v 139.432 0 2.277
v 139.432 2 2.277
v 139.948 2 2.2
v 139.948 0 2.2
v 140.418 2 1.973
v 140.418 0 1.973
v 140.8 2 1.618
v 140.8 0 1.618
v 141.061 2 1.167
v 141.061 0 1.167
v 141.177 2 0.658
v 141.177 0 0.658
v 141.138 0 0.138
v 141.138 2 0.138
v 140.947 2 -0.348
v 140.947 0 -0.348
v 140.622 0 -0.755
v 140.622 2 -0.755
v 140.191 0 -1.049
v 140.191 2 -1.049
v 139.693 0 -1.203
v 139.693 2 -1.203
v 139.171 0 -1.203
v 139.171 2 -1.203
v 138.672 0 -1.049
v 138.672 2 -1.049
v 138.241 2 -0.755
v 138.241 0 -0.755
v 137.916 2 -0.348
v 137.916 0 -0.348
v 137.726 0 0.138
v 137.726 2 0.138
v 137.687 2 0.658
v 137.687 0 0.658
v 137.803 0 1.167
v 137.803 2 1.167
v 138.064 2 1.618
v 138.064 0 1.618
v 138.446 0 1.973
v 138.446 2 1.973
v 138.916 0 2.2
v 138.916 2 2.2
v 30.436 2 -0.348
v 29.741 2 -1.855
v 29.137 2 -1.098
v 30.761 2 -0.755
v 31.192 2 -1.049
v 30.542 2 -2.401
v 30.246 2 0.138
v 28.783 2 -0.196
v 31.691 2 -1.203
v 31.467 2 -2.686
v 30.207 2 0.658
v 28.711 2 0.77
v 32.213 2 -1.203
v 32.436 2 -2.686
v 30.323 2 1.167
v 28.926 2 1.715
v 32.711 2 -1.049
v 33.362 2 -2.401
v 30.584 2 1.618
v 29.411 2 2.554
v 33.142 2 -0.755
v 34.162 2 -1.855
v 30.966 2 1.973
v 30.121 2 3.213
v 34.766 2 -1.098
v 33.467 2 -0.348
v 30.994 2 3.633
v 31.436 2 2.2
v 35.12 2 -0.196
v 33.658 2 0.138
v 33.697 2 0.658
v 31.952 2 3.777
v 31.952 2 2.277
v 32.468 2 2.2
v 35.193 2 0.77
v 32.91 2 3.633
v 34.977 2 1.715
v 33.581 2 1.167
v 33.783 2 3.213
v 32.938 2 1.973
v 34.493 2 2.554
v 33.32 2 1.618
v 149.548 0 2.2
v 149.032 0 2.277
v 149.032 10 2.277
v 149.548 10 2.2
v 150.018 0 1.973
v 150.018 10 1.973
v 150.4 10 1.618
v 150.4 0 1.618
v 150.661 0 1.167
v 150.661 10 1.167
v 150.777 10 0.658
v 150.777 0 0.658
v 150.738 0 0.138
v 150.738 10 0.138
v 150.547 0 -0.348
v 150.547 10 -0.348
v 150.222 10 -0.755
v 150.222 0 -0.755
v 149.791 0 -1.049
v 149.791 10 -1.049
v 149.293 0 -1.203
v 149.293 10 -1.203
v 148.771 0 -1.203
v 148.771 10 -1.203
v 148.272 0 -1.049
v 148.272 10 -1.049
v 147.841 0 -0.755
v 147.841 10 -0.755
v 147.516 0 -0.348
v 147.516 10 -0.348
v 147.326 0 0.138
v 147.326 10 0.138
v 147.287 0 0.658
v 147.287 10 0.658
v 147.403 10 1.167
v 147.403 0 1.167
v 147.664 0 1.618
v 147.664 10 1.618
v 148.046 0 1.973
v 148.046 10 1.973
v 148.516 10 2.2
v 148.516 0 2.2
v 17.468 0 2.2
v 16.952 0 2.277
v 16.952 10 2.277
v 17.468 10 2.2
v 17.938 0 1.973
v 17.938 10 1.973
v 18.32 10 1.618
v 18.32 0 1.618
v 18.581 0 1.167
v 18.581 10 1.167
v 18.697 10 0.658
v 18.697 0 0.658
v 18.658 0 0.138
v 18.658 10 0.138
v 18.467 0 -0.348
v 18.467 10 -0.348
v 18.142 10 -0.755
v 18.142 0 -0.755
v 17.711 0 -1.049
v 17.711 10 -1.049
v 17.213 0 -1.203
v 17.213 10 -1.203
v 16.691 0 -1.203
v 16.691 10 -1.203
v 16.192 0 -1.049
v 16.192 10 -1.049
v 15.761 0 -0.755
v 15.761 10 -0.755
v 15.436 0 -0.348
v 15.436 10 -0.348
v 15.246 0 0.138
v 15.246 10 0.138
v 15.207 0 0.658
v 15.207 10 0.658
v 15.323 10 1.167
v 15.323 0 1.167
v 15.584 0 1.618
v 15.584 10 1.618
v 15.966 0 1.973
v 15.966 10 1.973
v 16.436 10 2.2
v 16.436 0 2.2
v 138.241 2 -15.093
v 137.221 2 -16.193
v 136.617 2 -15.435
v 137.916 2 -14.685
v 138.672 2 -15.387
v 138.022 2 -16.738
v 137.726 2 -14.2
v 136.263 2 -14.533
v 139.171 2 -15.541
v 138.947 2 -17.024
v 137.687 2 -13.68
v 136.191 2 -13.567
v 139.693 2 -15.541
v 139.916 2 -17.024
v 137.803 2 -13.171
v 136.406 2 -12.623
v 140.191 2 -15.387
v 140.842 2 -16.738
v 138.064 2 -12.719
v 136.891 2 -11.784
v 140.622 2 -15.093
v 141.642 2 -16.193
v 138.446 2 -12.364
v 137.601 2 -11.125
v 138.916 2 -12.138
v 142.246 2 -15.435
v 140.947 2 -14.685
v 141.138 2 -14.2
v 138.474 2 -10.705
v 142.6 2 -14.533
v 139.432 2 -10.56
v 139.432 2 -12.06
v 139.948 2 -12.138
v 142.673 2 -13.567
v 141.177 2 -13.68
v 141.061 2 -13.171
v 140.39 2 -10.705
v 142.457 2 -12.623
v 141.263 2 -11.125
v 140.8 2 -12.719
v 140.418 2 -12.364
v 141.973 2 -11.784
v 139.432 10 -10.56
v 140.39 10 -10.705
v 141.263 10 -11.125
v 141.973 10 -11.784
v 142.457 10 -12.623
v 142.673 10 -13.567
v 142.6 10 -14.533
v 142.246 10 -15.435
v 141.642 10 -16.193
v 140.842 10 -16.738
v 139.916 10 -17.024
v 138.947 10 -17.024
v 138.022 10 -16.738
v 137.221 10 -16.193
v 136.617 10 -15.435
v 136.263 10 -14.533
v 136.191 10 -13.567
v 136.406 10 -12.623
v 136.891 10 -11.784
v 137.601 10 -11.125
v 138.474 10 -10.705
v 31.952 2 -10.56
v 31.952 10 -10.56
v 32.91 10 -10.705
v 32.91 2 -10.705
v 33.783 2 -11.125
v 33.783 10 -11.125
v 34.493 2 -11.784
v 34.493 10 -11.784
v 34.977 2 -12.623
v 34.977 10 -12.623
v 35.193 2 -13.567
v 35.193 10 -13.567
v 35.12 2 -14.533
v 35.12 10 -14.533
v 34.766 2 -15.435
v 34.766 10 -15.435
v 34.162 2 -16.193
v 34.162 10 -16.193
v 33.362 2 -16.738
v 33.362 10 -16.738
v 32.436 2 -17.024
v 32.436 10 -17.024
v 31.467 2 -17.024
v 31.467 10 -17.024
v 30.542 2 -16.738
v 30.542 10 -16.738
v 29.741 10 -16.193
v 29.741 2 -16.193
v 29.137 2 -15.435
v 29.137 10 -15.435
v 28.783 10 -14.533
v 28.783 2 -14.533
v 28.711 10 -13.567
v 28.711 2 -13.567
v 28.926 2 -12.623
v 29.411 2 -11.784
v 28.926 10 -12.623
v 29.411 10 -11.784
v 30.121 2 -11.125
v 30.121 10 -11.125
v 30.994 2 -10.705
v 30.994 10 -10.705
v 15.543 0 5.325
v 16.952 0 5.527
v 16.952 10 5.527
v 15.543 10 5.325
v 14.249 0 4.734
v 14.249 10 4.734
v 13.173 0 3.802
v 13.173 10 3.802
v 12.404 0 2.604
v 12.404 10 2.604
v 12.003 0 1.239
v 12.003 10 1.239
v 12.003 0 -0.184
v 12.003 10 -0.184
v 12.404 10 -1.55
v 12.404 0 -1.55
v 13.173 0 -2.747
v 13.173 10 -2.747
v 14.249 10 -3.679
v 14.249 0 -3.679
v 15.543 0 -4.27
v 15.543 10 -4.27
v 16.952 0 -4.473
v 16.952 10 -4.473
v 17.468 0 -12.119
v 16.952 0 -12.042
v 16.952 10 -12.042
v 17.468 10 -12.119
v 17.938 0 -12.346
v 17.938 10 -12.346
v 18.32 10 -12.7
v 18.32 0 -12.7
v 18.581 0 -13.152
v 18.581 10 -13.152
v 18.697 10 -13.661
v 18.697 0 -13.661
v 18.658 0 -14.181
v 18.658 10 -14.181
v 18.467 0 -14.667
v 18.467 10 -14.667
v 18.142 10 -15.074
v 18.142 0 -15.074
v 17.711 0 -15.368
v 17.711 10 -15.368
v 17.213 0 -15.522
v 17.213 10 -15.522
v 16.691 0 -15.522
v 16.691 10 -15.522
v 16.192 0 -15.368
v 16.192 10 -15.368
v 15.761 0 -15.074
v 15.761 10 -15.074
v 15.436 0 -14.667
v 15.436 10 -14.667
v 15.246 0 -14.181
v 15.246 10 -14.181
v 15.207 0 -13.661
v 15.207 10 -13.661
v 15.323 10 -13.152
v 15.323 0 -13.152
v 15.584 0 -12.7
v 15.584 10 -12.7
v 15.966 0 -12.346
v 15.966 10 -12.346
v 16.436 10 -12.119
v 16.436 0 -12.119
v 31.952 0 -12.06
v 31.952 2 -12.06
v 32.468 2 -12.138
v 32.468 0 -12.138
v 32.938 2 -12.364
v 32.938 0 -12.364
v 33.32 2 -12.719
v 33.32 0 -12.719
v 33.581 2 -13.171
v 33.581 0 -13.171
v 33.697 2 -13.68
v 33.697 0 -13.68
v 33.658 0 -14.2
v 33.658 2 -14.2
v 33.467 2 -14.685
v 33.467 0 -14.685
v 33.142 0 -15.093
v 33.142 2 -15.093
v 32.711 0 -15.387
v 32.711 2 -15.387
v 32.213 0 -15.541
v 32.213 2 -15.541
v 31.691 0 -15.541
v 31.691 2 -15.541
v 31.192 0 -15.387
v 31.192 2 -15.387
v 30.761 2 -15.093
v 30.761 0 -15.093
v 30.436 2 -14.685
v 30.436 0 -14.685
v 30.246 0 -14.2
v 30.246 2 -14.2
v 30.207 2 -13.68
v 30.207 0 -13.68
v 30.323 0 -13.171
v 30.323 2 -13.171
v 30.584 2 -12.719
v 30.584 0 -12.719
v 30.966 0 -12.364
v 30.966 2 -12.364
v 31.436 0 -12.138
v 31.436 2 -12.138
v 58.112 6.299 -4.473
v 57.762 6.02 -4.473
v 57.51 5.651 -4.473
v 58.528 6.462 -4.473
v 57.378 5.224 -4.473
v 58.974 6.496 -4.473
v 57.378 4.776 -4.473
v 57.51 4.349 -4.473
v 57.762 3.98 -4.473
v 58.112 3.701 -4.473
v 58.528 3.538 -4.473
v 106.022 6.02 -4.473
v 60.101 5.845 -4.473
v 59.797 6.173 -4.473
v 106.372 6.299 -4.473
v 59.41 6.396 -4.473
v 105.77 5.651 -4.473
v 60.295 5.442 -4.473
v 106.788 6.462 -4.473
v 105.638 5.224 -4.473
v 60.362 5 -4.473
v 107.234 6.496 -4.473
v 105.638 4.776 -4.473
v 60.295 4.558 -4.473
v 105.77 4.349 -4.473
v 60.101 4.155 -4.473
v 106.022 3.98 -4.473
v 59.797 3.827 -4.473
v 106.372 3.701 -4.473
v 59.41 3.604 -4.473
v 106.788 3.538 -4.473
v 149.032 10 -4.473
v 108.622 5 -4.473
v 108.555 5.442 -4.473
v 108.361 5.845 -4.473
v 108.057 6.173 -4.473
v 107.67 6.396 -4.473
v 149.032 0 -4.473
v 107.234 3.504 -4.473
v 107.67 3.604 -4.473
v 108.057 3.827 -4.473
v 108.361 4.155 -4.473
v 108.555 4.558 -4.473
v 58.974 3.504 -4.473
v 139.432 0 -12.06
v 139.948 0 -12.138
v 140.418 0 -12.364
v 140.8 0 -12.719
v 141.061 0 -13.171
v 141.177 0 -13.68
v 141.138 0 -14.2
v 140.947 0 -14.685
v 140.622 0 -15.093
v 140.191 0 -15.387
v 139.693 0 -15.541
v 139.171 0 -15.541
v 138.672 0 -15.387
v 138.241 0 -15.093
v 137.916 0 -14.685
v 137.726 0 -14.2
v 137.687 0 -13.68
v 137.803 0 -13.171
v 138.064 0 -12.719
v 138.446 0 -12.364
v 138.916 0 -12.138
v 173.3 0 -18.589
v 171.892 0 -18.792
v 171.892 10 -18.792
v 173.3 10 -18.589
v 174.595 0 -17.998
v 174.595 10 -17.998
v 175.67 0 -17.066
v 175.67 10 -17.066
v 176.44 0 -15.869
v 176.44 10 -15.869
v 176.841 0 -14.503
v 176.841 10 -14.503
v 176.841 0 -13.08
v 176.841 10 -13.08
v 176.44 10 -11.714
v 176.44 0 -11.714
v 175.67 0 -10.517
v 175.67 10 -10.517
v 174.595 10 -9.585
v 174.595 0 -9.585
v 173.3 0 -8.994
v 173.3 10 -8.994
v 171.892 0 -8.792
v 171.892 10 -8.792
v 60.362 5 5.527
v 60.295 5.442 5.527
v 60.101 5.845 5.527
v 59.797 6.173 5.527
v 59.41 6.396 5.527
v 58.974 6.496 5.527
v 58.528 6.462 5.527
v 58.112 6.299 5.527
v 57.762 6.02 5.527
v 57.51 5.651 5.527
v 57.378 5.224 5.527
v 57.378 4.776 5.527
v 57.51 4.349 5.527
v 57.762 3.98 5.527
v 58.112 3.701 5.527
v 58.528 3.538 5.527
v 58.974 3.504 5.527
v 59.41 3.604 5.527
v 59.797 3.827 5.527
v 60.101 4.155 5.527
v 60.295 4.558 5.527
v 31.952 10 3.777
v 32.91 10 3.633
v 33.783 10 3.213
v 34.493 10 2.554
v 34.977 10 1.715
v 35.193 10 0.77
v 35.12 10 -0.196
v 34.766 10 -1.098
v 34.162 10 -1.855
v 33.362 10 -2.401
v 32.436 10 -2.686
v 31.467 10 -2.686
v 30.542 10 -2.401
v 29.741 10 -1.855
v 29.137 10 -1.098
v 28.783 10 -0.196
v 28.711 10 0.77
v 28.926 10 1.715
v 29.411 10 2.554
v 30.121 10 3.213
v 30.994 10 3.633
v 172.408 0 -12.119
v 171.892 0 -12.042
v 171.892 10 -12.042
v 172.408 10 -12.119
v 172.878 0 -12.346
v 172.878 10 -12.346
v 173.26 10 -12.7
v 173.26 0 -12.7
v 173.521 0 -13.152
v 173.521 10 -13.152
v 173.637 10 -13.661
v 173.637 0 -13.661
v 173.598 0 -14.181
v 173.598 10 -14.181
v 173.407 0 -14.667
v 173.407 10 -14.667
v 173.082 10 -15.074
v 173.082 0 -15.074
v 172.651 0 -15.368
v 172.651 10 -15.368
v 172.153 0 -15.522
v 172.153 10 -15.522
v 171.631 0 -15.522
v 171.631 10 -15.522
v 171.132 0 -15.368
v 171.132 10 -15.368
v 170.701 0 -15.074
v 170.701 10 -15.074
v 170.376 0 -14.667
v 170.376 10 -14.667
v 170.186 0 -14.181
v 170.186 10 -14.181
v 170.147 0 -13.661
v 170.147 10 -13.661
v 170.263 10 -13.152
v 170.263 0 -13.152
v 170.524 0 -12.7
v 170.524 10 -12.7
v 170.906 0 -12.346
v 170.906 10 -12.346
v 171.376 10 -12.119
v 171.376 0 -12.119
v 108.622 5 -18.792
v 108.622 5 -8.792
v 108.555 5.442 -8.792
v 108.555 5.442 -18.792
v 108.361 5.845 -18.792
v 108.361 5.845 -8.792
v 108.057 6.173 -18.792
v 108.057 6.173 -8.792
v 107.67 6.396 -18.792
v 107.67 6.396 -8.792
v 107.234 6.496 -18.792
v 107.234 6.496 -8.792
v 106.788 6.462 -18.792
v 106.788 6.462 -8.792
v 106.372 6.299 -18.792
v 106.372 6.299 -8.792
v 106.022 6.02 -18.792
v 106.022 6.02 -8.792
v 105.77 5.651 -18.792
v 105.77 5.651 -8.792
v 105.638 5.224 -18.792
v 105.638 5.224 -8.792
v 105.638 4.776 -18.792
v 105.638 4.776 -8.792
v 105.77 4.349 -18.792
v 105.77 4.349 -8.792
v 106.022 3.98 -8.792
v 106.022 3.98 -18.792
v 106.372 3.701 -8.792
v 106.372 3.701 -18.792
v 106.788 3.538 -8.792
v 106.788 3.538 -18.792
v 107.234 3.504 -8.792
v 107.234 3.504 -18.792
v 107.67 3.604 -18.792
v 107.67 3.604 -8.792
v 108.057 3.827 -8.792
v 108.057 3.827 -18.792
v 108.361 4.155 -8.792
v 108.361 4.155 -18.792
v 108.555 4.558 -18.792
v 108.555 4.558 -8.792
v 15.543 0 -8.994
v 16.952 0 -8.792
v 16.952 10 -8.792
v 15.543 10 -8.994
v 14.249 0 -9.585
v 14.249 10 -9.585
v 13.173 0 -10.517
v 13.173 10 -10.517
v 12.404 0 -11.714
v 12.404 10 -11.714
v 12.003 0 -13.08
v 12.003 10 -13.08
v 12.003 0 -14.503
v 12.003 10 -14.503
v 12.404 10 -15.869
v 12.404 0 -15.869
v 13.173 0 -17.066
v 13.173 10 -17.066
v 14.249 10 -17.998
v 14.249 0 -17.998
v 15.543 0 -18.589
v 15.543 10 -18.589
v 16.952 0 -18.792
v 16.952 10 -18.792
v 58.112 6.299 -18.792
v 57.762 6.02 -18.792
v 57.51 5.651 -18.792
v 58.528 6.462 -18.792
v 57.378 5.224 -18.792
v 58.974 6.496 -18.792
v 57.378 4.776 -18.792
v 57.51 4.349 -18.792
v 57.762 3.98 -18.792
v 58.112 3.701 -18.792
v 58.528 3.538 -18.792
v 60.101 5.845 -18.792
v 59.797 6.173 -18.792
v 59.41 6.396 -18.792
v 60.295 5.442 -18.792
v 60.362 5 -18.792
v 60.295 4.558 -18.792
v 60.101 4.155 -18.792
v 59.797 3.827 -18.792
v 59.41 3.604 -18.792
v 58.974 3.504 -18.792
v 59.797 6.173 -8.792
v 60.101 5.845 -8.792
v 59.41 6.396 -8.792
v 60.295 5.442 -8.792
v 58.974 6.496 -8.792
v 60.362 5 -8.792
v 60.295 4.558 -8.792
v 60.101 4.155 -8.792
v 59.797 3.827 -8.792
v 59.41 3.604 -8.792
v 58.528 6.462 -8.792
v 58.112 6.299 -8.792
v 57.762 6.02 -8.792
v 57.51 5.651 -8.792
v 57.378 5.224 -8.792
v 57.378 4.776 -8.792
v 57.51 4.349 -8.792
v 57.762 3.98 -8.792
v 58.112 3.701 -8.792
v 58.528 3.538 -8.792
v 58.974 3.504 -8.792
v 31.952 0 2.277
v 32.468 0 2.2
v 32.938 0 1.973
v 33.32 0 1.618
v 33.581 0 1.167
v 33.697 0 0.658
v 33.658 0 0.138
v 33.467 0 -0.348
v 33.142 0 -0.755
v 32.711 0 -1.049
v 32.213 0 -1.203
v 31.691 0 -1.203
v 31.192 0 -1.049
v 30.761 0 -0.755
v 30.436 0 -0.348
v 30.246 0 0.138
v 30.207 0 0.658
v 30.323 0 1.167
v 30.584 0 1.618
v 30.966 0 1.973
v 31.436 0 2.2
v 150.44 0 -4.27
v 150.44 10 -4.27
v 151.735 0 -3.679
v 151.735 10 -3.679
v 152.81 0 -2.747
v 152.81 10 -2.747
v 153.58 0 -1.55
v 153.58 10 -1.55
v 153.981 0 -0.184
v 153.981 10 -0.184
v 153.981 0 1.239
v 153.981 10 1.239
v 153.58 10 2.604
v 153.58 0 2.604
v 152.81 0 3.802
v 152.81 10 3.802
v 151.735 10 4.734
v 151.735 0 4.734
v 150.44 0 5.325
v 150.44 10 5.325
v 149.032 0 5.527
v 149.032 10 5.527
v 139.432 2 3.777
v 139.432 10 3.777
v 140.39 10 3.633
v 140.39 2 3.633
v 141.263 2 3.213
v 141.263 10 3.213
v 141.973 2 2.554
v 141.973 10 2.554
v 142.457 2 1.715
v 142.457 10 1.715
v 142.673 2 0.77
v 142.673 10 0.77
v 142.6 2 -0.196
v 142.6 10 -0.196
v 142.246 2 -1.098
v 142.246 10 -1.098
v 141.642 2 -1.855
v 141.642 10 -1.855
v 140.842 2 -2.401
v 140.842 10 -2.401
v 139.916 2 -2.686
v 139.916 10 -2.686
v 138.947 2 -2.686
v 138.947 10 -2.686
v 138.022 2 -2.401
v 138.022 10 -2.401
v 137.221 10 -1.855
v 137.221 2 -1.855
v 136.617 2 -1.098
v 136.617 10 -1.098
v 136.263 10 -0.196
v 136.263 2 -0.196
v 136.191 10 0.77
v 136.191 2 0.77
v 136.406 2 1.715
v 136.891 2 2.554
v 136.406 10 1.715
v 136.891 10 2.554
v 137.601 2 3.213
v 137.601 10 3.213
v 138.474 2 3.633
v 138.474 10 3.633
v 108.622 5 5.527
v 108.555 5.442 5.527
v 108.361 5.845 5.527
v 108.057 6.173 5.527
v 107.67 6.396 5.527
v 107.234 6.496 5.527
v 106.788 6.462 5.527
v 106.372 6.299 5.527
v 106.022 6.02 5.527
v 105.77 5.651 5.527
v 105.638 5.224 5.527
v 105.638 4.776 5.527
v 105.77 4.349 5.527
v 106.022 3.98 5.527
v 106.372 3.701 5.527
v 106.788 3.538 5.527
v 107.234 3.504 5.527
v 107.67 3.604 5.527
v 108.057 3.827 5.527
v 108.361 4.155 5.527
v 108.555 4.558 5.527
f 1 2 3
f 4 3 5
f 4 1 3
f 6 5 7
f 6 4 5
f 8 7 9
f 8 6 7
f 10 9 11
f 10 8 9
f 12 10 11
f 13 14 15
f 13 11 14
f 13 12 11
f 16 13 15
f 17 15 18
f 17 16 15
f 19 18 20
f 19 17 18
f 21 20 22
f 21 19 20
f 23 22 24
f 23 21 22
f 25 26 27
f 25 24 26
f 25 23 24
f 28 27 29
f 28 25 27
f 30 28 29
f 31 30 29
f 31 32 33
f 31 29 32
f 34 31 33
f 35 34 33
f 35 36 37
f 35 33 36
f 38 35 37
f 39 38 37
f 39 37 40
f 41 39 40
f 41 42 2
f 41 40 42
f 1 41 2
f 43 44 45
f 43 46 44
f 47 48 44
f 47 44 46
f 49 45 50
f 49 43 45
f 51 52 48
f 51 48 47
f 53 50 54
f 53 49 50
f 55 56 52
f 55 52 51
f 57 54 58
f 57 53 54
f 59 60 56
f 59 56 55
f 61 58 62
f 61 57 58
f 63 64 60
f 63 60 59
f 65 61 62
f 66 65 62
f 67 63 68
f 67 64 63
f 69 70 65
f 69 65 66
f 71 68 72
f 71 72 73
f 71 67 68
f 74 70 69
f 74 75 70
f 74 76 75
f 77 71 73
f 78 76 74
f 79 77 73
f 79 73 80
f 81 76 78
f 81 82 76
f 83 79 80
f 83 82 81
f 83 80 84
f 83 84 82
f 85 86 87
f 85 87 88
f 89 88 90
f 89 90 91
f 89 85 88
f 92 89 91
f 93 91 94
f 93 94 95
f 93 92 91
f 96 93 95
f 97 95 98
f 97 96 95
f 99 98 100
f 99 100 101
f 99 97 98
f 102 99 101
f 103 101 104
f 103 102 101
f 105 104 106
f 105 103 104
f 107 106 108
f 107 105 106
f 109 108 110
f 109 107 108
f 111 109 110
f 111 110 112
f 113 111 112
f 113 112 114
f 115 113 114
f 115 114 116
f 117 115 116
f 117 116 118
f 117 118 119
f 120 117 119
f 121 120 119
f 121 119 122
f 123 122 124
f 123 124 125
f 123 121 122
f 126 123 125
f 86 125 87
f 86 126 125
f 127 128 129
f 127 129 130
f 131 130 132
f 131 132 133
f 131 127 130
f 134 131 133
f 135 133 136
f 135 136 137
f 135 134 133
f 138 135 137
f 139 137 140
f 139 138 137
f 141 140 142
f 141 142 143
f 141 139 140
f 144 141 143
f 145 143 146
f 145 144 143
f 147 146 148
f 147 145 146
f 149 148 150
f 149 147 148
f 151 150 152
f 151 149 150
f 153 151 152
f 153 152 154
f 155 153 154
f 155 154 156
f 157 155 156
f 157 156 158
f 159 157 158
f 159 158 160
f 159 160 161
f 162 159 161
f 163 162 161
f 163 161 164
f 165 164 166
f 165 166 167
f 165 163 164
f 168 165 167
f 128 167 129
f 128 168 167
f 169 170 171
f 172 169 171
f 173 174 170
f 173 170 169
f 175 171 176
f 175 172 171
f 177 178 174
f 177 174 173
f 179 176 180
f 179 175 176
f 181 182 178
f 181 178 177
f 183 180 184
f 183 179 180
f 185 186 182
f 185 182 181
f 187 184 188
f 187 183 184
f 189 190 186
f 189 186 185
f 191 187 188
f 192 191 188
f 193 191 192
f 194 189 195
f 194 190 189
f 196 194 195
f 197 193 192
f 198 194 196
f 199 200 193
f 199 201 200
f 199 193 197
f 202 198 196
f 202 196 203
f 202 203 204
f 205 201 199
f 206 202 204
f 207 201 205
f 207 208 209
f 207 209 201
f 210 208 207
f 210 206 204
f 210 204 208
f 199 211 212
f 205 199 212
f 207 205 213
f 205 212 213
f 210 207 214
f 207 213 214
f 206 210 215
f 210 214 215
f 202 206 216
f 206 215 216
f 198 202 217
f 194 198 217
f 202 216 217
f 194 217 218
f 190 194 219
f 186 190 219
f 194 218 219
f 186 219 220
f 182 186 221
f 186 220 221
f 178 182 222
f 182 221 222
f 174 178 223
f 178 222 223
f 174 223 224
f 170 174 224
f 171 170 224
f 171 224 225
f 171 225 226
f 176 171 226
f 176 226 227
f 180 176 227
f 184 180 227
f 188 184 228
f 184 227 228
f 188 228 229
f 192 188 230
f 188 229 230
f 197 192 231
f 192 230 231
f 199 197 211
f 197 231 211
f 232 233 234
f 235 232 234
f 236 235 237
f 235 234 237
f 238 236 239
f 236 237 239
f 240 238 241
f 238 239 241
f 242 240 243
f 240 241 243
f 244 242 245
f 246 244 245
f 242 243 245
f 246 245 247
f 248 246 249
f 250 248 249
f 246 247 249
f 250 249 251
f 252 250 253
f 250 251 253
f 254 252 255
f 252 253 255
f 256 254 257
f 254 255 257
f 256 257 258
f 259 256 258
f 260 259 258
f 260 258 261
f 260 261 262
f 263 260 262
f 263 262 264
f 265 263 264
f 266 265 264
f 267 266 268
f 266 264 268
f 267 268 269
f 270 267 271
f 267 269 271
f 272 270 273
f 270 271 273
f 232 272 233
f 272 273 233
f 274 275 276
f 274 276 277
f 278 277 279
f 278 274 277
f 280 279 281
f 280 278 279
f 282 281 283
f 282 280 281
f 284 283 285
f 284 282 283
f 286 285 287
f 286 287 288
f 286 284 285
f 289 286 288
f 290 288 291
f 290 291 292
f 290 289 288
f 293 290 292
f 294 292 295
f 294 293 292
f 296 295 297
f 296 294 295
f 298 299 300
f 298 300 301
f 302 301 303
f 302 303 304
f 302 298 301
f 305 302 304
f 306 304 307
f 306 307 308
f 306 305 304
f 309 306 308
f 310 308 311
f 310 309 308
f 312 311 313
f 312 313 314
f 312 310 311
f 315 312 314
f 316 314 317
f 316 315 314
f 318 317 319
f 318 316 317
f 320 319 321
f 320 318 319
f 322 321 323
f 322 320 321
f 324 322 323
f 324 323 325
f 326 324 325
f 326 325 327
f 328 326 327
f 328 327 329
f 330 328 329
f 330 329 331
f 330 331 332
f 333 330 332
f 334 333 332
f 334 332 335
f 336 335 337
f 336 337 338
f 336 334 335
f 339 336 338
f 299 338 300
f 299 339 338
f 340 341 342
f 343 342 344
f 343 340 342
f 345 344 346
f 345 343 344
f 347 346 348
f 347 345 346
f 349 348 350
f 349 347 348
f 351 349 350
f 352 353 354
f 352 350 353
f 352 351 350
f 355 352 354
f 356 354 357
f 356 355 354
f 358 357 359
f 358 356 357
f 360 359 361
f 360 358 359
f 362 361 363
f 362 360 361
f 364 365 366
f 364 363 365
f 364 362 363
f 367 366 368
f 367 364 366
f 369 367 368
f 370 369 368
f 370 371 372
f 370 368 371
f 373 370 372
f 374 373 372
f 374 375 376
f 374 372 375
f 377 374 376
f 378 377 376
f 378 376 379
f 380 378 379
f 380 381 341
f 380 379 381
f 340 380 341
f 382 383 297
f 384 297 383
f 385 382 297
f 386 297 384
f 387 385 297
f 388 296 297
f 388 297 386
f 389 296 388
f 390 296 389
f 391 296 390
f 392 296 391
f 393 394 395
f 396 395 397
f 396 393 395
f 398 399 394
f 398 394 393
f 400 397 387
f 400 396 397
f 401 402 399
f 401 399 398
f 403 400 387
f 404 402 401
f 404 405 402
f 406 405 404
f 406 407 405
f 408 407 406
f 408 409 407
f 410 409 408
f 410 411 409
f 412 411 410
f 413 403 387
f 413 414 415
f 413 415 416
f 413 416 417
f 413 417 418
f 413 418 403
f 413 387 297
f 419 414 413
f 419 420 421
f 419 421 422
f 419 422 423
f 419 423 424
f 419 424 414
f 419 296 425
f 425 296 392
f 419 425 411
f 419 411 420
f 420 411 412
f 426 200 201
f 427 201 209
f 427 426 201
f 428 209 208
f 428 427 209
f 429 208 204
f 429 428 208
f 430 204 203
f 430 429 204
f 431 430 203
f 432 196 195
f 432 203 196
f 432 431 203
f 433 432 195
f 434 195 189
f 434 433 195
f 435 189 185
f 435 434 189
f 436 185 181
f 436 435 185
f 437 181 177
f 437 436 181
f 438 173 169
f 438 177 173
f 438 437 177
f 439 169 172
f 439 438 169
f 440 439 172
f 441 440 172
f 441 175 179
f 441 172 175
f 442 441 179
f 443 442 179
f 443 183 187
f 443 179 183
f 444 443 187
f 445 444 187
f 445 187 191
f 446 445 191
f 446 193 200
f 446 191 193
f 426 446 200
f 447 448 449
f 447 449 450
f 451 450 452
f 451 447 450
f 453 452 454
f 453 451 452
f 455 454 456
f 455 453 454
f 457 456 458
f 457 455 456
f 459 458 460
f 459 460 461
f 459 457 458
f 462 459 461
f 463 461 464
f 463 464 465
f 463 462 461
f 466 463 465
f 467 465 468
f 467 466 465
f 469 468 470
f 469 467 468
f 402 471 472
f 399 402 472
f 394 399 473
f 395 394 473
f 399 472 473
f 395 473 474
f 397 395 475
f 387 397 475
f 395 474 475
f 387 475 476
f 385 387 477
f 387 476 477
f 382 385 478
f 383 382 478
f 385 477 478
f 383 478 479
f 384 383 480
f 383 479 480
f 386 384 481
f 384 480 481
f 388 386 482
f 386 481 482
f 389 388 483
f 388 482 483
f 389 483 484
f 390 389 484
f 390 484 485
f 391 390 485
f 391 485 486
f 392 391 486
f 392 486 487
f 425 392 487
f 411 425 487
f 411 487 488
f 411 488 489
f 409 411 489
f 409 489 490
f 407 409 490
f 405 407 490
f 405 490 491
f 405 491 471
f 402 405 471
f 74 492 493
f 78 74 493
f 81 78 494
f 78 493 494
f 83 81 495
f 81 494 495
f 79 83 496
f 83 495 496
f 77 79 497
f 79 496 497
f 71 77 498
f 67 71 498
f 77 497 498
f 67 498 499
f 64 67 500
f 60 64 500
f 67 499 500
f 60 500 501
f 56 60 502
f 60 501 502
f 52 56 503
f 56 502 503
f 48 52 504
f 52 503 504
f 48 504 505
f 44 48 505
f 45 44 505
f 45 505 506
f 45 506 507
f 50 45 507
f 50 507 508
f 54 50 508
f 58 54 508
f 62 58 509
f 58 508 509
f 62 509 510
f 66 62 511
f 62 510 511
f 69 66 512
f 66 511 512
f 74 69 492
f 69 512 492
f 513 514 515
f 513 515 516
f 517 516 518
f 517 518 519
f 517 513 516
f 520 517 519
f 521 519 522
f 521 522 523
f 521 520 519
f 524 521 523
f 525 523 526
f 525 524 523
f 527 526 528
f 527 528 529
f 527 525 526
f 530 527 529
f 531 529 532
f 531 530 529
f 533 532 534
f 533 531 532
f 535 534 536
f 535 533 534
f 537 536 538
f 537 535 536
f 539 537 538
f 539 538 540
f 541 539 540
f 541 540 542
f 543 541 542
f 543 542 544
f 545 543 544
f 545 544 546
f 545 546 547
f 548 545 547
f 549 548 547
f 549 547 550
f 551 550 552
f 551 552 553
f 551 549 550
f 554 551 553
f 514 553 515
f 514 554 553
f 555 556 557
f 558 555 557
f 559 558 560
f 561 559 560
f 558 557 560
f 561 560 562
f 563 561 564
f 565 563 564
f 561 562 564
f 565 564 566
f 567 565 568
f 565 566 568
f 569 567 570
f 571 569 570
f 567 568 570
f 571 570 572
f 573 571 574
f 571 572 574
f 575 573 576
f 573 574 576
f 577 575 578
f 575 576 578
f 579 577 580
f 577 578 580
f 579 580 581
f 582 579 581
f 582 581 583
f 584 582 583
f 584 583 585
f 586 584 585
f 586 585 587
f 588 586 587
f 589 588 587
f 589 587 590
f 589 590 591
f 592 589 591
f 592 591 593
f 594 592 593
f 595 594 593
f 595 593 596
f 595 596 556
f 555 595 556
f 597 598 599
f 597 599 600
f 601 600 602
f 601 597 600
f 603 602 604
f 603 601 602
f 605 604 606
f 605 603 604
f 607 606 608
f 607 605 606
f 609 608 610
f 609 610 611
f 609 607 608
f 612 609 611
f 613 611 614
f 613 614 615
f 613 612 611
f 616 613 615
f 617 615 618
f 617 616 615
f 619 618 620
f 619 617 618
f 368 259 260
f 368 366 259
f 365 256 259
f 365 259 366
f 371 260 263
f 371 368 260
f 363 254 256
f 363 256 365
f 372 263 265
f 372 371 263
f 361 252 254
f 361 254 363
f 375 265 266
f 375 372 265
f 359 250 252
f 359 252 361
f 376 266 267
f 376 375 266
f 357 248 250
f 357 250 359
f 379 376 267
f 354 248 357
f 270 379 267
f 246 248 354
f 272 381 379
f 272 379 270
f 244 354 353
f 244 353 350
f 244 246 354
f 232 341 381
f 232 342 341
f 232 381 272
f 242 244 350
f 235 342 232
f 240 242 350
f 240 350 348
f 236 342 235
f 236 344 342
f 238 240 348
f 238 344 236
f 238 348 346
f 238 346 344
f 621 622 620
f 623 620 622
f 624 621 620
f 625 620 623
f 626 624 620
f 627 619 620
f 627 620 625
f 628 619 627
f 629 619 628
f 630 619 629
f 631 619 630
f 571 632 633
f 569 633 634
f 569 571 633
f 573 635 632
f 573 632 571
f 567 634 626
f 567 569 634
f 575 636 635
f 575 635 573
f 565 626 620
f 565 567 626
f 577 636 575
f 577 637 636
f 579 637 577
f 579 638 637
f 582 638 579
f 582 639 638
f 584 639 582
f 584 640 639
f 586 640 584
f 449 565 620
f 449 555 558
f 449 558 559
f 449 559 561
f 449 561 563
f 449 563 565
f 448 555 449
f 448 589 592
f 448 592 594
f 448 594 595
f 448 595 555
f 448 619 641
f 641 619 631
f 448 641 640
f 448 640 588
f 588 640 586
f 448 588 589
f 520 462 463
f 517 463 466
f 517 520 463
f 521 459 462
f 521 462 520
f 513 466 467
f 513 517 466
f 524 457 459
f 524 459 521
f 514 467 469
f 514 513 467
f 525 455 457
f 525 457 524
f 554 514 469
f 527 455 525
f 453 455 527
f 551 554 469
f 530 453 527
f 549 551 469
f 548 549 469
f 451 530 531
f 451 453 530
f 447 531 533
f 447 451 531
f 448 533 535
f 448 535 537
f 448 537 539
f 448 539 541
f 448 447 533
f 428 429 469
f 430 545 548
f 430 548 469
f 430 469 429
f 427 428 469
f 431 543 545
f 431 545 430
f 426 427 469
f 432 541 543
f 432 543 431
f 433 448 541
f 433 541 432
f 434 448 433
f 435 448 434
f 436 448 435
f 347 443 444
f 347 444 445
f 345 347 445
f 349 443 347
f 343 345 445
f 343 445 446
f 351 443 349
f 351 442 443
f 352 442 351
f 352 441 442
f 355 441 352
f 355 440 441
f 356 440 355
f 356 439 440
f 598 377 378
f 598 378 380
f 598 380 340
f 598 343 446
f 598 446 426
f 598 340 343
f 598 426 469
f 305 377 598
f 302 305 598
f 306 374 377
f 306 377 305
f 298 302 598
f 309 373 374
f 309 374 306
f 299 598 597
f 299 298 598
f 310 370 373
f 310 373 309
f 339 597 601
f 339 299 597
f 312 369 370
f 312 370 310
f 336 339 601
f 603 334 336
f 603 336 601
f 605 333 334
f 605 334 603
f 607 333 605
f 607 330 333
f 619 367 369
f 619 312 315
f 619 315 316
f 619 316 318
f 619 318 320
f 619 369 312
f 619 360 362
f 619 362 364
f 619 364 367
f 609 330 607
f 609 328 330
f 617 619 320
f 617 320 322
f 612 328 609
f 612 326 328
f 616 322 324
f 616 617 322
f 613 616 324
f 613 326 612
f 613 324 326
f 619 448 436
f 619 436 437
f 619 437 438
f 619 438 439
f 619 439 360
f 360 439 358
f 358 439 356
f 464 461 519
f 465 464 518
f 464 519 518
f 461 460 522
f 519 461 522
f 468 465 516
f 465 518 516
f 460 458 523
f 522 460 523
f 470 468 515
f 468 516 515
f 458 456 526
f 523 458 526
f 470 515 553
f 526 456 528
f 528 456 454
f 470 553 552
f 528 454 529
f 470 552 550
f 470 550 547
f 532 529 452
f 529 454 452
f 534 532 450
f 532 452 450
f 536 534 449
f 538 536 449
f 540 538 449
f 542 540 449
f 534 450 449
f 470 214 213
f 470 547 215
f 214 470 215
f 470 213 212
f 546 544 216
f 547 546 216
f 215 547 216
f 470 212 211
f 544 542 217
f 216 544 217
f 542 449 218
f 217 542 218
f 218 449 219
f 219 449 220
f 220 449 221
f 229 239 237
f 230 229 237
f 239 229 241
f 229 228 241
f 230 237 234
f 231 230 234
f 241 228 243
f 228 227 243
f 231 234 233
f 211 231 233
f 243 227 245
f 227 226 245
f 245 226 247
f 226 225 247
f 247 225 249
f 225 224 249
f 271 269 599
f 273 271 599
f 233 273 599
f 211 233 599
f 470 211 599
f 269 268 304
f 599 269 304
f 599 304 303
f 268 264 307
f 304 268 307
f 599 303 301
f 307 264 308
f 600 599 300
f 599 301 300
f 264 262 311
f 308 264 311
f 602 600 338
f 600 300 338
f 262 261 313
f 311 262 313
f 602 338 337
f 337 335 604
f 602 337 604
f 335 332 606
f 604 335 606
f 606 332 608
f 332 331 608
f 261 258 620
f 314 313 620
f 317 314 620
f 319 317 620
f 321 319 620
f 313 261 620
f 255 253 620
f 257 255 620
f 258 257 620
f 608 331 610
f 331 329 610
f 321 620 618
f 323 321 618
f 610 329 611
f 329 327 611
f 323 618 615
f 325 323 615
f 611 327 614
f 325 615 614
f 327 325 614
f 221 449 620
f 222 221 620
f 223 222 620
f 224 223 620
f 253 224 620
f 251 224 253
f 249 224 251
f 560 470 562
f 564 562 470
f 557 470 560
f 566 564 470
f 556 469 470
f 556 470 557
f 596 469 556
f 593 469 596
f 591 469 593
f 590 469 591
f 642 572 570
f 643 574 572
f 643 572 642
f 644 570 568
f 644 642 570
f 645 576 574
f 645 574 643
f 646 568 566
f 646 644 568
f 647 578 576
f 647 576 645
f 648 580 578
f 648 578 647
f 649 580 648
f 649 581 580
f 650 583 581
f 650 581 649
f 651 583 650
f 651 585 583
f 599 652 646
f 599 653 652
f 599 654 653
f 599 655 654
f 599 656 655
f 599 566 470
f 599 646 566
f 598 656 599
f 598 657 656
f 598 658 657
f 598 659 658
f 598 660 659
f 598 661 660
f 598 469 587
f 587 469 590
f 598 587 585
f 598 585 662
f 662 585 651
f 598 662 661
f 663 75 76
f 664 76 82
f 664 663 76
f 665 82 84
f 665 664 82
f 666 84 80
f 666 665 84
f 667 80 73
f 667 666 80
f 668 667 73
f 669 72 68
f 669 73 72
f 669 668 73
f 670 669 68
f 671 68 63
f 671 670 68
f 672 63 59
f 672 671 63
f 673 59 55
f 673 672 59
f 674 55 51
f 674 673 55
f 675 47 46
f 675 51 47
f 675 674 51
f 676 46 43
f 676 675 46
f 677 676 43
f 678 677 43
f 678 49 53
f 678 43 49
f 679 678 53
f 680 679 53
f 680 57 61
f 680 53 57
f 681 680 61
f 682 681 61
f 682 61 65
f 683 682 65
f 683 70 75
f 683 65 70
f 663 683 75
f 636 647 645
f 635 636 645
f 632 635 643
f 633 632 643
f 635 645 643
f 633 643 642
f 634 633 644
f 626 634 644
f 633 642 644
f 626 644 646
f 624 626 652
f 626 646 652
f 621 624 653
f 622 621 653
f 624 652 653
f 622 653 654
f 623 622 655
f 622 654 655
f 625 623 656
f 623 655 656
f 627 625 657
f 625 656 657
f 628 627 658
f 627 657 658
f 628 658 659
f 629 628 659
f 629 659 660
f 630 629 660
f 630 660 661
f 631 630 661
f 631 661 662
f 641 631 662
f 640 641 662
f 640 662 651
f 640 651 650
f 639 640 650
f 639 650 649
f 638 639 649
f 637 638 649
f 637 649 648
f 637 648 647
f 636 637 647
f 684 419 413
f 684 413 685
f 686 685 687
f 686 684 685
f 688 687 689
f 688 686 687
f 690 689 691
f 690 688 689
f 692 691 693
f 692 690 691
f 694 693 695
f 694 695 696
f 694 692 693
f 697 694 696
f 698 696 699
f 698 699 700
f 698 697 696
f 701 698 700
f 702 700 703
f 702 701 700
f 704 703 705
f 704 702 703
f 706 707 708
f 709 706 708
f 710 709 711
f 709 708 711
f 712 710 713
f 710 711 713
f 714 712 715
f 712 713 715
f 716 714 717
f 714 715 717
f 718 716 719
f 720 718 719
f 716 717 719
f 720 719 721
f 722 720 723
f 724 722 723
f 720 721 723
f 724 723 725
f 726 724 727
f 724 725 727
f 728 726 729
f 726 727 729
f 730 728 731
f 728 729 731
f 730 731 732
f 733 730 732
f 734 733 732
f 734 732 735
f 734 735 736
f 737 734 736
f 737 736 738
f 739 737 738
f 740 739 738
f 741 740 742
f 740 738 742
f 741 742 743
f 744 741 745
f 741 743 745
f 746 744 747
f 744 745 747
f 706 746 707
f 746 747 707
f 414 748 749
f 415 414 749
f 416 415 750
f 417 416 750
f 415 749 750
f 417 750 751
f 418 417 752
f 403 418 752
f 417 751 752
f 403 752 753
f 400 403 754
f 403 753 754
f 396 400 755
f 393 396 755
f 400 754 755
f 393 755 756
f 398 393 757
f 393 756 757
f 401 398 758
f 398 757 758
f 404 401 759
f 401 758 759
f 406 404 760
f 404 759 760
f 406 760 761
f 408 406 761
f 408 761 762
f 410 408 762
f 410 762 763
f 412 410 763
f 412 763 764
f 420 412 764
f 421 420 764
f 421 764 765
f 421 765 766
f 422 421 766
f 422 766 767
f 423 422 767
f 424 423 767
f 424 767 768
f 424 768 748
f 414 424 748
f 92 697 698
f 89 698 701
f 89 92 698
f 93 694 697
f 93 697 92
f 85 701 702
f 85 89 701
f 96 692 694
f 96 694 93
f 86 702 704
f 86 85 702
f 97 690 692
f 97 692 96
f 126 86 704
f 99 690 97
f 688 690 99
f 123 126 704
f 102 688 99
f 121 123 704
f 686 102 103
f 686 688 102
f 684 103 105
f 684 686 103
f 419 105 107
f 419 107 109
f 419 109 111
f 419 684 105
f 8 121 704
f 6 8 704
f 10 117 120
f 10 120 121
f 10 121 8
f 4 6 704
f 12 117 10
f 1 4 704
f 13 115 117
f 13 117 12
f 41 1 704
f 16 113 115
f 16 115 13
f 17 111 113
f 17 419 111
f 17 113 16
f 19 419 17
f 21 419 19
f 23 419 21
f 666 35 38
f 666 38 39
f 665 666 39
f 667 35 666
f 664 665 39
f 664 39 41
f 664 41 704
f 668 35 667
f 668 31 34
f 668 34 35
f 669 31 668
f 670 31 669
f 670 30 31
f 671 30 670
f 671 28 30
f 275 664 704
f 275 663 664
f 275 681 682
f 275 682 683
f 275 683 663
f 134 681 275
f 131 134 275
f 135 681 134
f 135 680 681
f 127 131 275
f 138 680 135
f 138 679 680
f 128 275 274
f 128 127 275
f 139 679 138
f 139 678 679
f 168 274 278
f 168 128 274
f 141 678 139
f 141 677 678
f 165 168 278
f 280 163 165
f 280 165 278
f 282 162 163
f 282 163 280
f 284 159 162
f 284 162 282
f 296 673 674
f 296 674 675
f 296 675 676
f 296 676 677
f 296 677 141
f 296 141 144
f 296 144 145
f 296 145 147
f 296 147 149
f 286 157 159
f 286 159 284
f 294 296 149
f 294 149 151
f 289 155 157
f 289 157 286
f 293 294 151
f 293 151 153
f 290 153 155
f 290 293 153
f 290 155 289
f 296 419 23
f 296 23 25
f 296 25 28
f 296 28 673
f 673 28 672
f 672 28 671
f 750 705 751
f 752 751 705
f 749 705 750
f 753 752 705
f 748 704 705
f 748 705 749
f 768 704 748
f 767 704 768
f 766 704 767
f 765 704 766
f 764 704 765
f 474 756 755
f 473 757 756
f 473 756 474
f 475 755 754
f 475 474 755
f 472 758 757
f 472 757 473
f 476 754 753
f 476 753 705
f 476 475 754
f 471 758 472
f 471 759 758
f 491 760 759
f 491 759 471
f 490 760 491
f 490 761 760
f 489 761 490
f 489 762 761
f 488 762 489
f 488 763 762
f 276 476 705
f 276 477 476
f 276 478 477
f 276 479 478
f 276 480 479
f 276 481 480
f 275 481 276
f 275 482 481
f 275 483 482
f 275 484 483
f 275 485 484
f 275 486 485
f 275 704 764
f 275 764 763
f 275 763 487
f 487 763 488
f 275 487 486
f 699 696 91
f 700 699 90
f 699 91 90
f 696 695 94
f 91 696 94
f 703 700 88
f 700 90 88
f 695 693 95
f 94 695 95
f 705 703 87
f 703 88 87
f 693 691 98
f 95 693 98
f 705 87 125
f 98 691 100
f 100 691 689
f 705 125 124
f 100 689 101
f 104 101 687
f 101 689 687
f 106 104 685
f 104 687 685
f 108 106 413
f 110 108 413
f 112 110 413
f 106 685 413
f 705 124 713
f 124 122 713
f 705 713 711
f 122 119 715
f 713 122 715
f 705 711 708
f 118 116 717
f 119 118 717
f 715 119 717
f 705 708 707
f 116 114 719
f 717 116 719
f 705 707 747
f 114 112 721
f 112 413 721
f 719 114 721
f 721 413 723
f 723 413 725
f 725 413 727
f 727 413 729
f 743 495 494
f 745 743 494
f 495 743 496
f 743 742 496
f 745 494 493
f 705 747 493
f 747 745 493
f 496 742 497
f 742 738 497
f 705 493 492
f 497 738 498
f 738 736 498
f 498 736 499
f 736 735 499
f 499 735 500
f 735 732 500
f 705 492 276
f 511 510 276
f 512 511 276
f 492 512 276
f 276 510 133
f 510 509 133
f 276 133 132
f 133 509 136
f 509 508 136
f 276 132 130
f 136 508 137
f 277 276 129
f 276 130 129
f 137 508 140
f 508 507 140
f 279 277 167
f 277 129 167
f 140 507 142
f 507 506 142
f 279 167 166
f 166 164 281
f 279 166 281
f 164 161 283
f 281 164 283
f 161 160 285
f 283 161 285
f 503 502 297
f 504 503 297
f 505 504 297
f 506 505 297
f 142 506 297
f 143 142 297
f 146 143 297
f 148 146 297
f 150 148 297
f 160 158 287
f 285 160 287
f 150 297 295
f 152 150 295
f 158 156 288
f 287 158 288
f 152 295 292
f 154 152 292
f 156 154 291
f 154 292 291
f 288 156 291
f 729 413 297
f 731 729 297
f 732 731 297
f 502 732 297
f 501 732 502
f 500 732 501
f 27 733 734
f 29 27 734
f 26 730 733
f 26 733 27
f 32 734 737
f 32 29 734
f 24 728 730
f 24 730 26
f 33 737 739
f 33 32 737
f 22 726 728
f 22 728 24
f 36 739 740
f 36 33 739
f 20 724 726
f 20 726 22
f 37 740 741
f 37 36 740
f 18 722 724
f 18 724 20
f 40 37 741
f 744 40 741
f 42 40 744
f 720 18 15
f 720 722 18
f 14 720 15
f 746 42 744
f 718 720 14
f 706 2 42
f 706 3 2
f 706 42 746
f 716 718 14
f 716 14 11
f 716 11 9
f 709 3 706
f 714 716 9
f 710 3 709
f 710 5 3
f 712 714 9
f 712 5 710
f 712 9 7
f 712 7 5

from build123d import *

# Parameters (mm, degrees)
SKETCH1_R             = 1.75
BOSS_EXTRUDE1_DEPTH   = 10
BOSS_EXTRUDE1_2_DEPTH = 10
SKETCH2_R             = 1.5
CUT_EXTRUDE1_DEPTH    = 179.835360122
SKETCH4_R             = 3.25
CUT_EXTRUDE2_DEPTH    = 8


with BuildPart() as part:
    # Sketch1 → Boss-Extrude1 (new body)
    with BuildSketch(Plane(origin=(0, 0, 0), x_dir=(1, 0, 0), z_dir=(0, 1, 0))):
        with BuildLine():
            Line((16.951711967, 18.791545065), (171.891711967, 18.791545065))
            ThreePointArc((171.891711967, 18.791545065), (176.891711967, 13.791545065), (171.891711967, 8.791545065))
            Line((171.891711967, 8.791545065), (16.951711967, 8.791545065))
            ThreePointArc((16.951711967, 8.791545065), (11.951711967, 13.791545065), (16.951711967, 18.791545065))
        make_face()
        with Locations(Location((16.951711967, 13.791545065, 0), (0, 0, 270))):
            Circle(SKETCH1_R, mode=Mode.SUBTRACT)
        with Locations(Location((31.951711967, 13.810297164, 0), (0, 0, 270))):
            Circle(SKETCH1_R, mode=Mode.SUBTRACT)
        with Locations(Location((139.431711967, 13.810297164, 0), (0, 0, 270))):
            Circle(SKETCH1_R, mode=Mode.SUBTRACT)
        with Locations(Location((171.891711967, 13.791545065, 0), (0, 0, 270))):
            Circle(SKETCH1_R, mode=Mode.SUBTRACT)
    extrude(amount=BOSS_EXTRUDE1_DEPTH)


with BuildPart() as body_2:
    # Sketch1 → Boss-Extrude1 2 (new body)
    with BuildSketch(Plane(origin=(0, 0, 0), x_dir=(1, 0, 0), z_dir=(0, 1, 0))):
        with BuildLine():
            Line((16.951711967, 4.472658016), (149.031711967, 4.472658016))
            ThreePointArc((149.031711967, 4.472658016), (154.031711967, -0.527341984), (149.031711967, -5.527341984))
            Line((149.031711967, -5.527341984), (16.951711967, -5.527341984))
            ThreePointArc((16.951711967, -5.527341984), (11.951711967, -0.527341984), (16.951711967, 4.472658016))
        make_face()
        with Locations(Location((16.951711967, -0.527341984, 0), (0, 0, 270))):
            Circle(SKETCH1_R, mode=Mode.SUBTRACT)
        with Locations(Location((31.951711967, -0.527341984, 0), (0, 0, 270))):
            Circle(SKETCH1_R, mode=Mode.SUBTRACT)
        with Locations(Location((139.431711967, -0.527341984, 0), (0, 0, 270))):
            Circle(SKETCH1_R, mode=Mode.SUBTRACT)
        with Locations(Location((149.031711967, -0.527341984, 0), (0, 0, 270))):
            Circle(SKETCH1_R, mode=Mode.SUBTRACT)
    extrude(amount=BOSS_EXTRUDE1_2_DEPTH)


with BuildPart() as cut_extrude1_tool:
    # Sketch2 → Cut-Extrude1 (new, through all)
    with BuildSketch(Plane.XY.offset(5.527341984)):
        with Locations((58.861711967, 5)):
            Circle(SKETCH2_R)
        with Locations((107.121711967, 5)):
            Circle(SKETCH2_R)
    extrude(amount=-CUT_EXTRUDE1_DEPTH)


with BuildPart() as part_1:
    add(part.part)

    # Cut-Extrude1: cut by cut_extrude1_tool
    add(cut_extrude1_tool.part, mode=Mode.SUBTRACT)


with BuildPart() as body_2_1:
    add(body_2.part)

    # Cut-Extrude1: cut by cut_extrude1_tool
    add(cut_extrude1_tool.part, mode=Mode.SUBTRACT)


with BuildPart() as cut_extrude2_tool:
    # Sketch4 → Cut-Extrude2 (new body)
    with BuildSketch(Plane(origin=(0, 10, 0), x_dir=(1, 0, 0), z_dir=(0, 1, 0))):
        with Locations(Location((31.951711967, 13.810297164, 0), (0, 0, 270))):
            Circle(SKETCH4_R)
        with Locations(Location((31.951711967, -0.527341984, 0), (0, 0, 270))):
            Circle(SKETCH4_R)
        with Locations(Location((139.431711967, -0.527341984, 0), (0, 0, 270))):
            Circle(SKETCH4_R)
        with Locations(Location((139.431711967, 13.810297164, 0), (0, 0, 270))):
            Circle(SKETCH4_R)
    extrude(amount=-CUT_EXTRUDE2_DEPTH)


with BuildPart() as part_2:
    add(part_1.part)

    # Cut-Extrude2: cut by cut_extrude2_tool
    add(cut_extrude2_tool.part, mode=Mode.SUBTRACT)


with BuildPart() as body_2_2:
    add(body_2_1.part)

    # Cut-Extrude2: cut by cut_extrude2_tool
    add(cut_extrude2_tool.part, mode=Mode.SUBTRACT)


solid = Compound([part_2.part, body_2_2.part])
